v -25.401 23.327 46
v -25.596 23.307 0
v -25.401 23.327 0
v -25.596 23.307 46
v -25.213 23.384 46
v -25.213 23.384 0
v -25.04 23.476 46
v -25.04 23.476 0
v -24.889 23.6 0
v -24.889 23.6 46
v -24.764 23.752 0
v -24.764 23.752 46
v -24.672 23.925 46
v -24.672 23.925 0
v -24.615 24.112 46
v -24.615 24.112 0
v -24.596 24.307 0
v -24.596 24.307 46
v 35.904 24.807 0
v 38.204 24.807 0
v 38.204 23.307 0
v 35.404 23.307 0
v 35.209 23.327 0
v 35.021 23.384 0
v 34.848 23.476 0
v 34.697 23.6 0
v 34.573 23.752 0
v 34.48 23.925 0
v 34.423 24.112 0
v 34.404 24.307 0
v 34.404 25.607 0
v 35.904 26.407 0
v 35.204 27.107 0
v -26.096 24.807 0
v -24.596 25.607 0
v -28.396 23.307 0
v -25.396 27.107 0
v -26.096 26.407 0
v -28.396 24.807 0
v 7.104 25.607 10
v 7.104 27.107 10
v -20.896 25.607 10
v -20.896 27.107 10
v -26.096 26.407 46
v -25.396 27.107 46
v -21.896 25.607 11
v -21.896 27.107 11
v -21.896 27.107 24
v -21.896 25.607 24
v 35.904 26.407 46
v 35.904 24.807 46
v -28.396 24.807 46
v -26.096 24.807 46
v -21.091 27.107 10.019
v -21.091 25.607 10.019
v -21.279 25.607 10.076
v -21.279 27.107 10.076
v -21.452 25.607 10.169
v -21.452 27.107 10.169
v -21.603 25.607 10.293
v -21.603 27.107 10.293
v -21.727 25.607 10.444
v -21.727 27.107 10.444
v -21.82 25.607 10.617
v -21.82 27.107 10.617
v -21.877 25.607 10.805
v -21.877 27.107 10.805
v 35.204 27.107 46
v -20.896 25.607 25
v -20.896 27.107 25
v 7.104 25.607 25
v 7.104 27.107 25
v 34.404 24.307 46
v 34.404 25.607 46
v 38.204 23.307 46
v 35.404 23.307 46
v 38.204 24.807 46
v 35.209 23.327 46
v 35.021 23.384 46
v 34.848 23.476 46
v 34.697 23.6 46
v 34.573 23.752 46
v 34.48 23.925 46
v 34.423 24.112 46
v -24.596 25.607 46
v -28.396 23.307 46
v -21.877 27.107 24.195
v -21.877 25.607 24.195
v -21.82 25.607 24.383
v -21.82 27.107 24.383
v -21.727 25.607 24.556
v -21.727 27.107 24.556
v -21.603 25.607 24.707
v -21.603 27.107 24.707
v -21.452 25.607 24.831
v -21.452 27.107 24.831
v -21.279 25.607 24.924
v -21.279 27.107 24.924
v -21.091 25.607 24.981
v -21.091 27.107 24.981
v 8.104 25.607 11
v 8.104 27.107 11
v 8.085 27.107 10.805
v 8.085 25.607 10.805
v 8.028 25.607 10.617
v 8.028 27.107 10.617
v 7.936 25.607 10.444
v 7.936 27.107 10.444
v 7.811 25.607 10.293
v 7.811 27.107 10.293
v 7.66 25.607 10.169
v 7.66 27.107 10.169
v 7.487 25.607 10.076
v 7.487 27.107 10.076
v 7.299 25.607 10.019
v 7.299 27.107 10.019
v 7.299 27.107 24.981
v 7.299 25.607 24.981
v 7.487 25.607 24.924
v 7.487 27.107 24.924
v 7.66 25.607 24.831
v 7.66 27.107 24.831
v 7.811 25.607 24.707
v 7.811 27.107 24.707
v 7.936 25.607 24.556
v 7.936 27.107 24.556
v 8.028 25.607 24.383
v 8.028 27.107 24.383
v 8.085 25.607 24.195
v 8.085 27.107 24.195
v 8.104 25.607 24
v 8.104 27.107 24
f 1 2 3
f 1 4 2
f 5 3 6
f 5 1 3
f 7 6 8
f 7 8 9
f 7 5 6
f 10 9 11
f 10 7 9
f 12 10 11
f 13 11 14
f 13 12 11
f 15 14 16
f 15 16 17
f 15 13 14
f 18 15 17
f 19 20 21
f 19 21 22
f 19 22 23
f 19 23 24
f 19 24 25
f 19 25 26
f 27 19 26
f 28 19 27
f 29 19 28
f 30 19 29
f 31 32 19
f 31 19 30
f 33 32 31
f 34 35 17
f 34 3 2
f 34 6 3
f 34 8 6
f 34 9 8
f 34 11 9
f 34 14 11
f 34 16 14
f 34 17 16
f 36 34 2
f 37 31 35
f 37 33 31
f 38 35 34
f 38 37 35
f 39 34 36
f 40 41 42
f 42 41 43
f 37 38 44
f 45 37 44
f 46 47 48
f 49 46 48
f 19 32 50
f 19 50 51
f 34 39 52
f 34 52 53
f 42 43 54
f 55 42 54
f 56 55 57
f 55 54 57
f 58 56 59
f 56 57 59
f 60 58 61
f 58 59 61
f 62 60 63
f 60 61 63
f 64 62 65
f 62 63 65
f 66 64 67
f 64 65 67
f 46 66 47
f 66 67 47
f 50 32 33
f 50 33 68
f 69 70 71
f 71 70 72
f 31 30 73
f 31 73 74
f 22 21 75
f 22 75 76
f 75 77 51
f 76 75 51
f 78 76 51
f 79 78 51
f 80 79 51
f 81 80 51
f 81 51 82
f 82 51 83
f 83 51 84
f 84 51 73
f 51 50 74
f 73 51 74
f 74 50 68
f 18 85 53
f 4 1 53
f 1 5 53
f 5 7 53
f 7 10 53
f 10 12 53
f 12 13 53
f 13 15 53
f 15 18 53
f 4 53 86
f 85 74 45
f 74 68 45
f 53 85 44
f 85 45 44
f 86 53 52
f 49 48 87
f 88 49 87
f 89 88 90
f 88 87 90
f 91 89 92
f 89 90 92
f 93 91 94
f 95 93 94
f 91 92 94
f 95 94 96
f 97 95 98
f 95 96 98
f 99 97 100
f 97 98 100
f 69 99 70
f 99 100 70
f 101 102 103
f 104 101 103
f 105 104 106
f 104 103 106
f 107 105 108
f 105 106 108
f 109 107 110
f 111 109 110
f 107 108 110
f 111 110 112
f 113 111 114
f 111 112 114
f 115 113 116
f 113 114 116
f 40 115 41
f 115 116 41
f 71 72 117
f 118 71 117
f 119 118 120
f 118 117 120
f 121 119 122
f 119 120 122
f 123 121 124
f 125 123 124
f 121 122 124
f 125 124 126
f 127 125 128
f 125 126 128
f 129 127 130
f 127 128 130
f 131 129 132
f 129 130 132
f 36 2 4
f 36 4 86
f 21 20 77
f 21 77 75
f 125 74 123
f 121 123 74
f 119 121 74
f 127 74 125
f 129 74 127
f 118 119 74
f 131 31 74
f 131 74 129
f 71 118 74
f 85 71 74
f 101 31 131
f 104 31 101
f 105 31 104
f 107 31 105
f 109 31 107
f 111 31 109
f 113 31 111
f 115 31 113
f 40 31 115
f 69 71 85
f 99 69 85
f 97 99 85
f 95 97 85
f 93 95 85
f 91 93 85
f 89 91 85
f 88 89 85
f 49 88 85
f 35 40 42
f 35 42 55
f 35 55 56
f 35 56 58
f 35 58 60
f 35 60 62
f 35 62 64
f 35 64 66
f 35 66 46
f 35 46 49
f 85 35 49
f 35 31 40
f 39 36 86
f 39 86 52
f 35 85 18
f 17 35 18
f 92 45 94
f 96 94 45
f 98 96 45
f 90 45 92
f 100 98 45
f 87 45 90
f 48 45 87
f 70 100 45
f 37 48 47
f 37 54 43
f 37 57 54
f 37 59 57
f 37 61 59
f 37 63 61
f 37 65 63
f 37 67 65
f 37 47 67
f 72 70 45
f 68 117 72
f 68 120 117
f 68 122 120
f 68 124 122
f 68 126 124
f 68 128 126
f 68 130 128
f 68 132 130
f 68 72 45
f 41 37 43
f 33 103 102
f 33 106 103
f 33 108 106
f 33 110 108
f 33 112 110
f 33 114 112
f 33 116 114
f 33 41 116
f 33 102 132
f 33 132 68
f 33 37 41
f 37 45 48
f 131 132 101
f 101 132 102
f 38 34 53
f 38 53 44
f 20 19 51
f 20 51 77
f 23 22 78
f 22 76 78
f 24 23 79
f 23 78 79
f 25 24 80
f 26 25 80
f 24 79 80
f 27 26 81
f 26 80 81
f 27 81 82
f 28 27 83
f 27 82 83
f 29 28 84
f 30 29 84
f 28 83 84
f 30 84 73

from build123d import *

# Parameters (mm, degrees)
PAD_DEPTH    = 46
CHAMFER_SIZE = 0.7
FILLET_R     = 1
POCKET_DEPTH = 2


with BuildPart() as part:
    # Sketch → Pad (new body)
    with BuildSketch(Plane.XY):
        Polygon((-26.095954, 27.107406), (35.904046, 27.107406), (35.904046, 24.807406), (38.204046, 24.807406), (38.204046, 23.307406), (34.404046, 23.307406), (34.404046, 25.607406), (-24.595954, 25.607406), (-24.595954, 23.307406), (-28.395954, 23.307406), (-28.395954, 24.807406), (-26.095954, 24.807406), align=None)
    extrude(amount=PAD_DEPTH)

    # Chamfer
    chamfer_edges = [part.edges().sort_by_distance(p)[0] for p in [
        (35.904046, 27.107406, 23),
        (-26.095954, 27.107406, 23),
    ]]
    chamfer(chamfer_edges, length=CHAMFER_SIZE)

    # Fillet
    fillet_edges = [part.edges().sort_by_distance(p)[0] for p in [
        (-24.595954, 23.307406, 23),
        (34.404046, 23.307406, 23),
    ]]
    fillet(fillet_edges, radius=FILLET_R)

    # Sketch001 (on Face12 of Fillet) → Pocket (cut)
    with BuildSketch(Plane(origin=(0, 27.107406, 0), x_dir=(-1, 0, 0), z_dir=(0, 1, 0))):
        with BuildLine():
            Line((20.895954, 25), (-7.104046, 25))
            ThreePointArc((-7.104046, 25), (-7.811153, 24.707107), (-8.104046, 24))
            Line((-8.104046, 24), (-8.104046, 11))
            ThreePointArc((-8.104046, 11), (-7.811153, 10.292893), (-7.104046, 10))
            Line((-7.104046, 10), (20.895954, 10))
            ThreePointArc((20.895954, 10), (21.603061, 10.292893), (21.895954, 11))
            Line((21.895954, 11), (21.895954, 24))
            ThreePointArc((21.895954, 24), (21.603061, 24.707107), (20.895954, 25))
        make_face()
    extrude(amount=-POCKET_DEPTH, mode=Mode.SUBTRACT)


solid = part.part
